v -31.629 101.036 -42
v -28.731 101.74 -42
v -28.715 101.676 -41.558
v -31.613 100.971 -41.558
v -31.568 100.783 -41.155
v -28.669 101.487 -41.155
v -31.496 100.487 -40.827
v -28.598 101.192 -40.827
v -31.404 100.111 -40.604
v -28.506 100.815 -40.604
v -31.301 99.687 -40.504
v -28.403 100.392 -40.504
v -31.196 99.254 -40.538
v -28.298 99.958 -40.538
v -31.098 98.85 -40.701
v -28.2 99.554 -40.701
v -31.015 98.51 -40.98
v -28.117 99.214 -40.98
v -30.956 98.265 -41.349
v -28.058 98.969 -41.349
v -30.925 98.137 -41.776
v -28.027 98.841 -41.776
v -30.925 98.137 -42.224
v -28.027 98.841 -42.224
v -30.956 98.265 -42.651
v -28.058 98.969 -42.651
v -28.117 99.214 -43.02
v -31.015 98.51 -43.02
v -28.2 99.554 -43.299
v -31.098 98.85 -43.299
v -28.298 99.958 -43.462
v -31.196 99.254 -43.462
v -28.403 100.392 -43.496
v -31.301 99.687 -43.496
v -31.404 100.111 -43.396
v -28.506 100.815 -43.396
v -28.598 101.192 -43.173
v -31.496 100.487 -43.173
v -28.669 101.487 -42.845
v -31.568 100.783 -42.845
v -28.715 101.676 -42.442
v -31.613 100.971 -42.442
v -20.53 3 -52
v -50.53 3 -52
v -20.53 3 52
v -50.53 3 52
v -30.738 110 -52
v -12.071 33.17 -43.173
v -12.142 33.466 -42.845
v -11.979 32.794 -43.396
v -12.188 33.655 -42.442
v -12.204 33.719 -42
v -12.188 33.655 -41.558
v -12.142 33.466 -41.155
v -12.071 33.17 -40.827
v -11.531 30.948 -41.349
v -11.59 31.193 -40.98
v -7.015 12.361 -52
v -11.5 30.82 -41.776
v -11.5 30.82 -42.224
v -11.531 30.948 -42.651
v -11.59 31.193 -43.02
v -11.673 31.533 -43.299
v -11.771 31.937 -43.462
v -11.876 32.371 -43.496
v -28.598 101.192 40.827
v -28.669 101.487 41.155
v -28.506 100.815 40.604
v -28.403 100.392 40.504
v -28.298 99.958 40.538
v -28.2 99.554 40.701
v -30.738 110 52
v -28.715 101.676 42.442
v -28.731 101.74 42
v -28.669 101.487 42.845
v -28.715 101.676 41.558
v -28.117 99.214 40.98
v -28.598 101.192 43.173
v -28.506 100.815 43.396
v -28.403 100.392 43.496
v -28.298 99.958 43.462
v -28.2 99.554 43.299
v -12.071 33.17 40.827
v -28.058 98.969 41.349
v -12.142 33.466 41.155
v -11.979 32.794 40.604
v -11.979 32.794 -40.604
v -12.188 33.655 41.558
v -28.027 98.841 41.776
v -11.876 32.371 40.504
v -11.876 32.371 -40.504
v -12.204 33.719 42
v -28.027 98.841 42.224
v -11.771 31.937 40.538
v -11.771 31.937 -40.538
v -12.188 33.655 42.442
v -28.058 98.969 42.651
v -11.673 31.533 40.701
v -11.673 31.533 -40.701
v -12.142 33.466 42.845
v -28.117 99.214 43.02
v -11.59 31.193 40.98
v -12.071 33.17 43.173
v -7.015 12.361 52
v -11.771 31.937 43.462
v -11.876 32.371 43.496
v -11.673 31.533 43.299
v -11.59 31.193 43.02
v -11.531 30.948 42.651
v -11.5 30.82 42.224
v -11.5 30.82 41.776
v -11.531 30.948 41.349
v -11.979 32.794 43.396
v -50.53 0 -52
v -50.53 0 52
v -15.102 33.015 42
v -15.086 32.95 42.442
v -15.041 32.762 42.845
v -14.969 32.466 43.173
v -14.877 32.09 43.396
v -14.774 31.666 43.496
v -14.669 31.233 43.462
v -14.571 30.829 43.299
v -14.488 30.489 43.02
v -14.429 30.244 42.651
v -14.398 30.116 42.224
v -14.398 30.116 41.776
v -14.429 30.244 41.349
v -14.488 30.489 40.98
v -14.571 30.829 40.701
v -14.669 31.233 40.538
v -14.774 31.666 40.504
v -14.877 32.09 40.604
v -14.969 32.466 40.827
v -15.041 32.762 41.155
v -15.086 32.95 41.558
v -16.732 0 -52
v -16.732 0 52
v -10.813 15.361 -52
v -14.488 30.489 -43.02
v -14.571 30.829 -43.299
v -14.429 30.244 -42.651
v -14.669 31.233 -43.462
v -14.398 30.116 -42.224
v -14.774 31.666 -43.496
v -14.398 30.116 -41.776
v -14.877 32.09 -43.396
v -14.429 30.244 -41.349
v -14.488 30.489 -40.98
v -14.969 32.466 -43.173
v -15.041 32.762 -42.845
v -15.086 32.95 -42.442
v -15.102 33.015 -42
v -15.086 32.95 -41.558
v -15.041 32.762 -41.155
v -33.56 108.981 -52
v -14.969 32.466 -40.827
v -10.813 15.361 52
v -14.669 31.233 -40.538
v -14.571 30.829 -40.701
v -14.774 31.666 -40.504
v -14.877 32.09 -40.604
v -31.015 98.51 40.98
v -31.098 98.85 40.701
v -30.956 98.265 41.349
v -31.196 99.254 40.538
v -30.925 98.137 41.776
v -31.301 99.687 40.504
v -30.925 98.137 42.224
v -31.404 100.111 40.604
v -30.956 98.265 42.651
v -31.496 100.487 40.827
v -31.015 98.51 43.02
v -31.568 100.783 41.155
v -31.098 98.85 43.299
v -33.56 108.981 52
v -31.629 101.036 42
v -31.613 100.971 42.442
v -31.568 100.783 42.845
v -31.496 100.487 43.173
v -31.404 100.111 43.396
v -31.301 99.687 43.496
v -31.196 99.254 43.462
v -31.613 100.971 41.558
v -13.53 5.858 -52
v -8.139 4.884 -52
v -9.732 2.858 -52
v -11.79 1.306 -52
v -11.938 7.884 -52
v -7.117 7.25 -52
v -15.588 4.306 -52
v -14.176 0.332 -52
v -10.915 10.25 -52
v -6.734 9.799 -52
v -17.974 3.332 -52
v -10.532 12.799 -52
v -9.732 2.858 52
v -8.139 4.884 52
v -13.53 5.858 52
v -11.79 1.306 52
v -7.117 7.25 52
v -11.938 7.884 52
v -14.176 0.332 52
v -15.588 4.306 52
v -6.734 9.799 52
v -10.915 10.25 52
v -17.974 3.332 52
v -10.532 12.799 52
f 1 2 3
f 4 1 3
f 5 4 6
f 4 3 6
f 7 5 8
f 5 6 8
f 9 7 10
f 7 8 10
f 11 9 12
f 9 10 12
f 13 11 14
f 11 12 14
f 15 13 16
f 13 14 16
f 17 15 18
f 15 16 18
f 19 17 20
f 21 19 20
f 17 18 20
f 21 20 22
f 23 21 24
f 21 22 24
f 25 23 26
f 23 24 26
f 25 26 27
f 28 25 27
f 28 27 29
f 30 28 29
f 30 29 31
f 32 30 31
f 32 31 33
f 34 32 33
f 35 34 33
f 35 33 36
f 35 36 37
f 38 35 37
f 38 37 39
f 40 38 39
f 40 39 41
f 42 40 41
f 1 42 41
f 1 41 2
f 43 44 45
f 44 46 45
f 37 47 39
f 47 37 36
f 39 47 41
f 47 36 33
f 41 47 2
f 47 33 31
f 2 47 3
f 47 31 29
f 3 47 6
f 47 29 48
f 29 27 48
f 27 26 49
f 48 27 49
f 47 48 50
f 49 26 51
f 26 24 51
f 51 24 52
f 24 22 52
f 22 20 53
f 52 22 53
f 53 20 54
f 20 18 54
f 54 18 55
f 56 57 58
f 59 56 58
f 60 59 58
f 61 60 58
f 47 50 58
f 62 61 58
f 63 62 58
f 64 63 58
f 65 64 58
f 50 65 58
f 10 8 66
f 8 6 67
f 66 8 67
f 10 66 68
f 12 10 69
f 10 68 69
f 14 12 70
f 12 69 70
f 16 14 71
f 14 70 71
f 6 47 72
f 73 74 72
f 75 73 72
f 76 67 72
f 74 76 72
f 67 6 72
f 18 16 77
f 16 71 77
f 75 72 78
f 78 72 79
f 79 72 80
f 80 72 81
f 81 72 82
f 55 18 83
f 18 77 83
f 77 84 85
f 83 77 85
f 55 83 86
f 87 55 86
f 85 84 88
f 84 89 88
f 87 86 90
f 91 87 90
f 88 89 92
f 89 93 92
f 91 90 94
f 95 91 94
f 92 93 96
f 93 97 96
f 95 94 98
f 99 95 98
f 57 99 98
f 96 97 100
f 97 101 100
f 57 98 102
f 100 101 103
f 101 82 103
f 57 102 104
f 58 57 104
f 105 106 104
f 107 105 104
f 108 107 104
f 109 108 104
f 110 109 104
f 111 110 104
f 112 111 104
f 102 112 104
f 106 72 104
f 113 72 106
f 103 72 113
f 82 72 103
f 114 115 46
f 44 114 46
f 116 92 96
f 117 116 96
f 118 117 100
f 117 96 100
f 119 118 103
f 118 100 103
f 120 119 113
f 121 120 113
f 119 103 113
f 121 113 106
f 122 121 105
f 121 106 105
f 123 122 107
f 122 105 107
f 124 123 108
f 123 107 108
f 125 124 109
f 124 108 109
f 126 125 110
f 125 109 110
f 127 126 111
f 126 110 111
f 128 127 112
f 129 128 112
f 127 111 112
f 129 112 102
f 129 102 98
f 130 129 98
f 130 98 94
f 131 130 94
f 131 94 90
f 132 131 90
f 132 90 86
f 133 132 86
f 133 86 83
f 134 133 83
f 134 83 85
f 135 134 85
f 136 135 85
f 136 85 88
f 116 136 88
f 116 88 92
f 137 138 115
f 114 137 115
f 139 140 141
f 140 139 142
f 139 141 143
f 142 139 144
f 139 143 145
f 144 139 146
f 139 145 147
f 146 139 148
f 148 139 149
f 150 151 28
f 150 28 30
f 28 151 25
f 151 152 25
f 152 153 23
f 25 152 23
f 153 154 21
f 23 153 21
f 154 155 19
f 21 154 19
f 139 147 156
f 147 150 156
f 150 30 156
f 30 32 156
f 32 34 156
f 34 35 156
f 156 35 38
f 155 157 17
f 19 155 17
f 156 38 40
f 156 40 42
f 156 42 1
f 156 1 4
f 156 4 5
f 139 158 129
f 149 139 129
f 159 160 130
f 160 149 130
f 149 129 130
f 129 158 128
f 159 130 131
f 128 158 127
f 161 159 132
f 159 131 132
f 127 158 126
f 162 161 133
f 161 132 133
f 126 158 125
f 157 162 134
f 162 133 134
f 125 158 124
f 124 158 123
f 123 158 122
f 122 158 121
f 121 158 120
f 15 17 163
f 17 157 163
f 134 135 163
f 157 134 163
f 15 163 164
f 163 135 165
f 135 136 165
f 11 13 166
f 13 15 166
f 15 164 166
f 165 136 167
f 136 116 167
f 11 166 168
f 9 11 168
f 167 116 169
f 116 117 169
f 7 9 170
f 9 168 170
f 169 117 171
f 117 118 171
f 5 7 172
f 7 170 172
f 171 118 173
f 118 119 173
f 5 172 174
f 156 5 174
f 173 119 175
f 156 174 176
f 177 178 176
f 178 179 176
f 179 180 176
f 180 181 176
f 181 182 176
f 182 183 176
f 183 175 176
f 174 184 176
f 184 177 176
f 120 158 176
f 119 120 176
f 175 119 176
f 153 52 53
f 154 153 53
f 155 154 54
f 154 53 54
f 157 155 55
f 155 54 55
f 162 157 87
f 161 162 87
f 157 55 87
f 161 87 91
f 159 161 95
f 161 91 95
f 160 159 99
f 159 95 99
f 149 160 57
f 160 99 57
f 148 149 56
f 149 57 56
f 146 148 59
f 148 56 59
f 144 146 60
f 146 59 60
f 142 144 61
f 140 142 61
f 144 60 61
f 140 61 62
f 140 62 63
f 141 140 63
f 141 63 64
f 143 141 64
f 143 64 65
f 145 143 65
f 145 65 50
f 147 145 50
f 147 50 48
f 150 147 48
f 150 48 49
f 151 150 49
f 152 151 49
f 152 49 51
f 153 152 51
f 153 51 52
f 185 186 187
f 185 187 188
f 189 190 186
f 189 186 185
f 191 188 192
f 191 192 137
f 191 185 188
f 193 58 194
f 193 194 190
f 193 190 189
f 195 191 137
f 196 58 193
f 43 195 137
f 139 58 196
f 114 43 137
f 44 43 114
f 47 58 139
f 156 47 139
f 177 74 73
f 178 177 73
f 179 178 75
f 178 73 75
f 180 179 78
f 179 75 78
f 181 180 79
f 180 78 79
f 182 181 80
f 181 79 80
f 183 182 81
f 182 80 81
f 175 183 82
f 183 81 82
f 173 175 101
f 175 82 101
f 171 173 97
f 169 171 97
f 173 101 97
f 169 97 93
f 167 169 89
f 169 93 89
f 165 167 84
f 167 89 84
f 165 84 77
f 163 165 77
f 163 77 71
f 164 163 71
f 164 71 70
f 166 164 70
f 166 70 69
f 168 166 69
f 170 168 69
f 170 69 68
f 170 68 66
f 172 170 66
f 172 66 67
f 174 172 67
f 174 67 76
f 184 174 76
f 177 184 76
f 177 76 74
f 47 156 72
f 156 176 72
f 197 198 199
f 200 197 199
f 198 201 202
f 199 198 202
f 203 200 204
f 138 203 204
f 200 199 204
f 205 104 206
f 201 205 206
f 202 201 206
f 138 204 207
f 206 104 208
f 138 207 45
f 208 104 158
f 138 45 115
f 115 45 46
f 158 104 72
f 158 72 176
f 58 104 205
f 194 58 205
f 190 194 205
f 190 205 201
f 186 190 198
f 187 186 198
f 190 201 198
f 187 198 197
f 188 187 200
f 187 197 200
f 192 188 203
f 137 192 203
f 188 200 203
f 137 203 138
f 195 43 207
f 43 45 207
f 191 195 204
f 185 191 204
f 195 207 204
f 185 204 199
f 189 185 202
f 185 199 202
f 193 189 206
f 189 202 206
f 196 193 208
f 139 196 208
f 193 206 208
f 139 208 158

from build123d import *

# Parameters (mm, degrees)
BOSS_EXTRUDE1_DEPTH = 52
CUT_EXTRUDE_1_REACH = 133.119
SKETCH_2_R          = 1.5


with BuildPart() as part:
    # Sketch1 → Boss-Extrude1 (new, symmetric)
    with BuildSketch(Plane.XY):
        with BuildLine():
            Line((-50.530004832, 0), (-50.530004832, 3))
            Line((-50.530004832, 3), (-20.530004832, 3))
            ThreePointArc((-20.530004832, 3), (-12.668388321, 6.819790793), (-10.812717884, 15.361002831))
            Line((-10.812717884, 15.361002831), (-33.559523327, 108.981066609))
            Line((-33.559523327, 108.981066609), (-30.737861628, 110))
            Line((-30.737861628, 110), (-7.014578577, 12.361002831))
            ThreePointArc((-7.014578577, 12.361002831), (-8.870249014, 3.819790793), (-16.731865525, 0))
            Line((-16.731865525, 0), (-50.530004832, 0))
        make_face()
    extrude(amount=BOSS_EXTRUDE1_DEPTH, both=True)

    # Эскиз2 → Вырез-Вытянуть1 (cut, up to next)
    with BuildSketch(Plane(origin=(-3.787634246, -0.920279007, 0), x_dir=(0, 0, -1), z_dir=(0.9717286948053453, 0.2361002831254127, 0)), mode=Mode.PRIVATE) as cut_extrude_1_sk1:
        with Locations(Location((-42, 104.147374262, 0), (0, 0, 90))):
            Circle(SKETCH_2_R)
    cut_extrude_1_tool1 = extrude(cut_extrude_1_sk1.sketch, amount=-CUT_EXTRUDE_1_REACH, mode=Mode.PRIVATE) & part.part
    # Эскиз2 → Вырез-Вытянуть1 (cut, up to next)
    with BuildSketch(Plane(origin=(-3.787634246, -0.920279007, 0), x_dir=(0, 0, -1), z_dir=(0.9717286948053453, 0.2361002831254127, 0)), mode=Mode.PRIVATE) as cut_extrude_1_sk2:
        with Locations(Location((42, 104.147374262, 0), (0, 0, 90))):
            Circle(SKETCH_2_R)
    cut_extrude_1_tool2 = extrude(cut_extrude_1_sk2.sketch, amount=-CUT_EXTRUDE_1_REACH, mode=Mode.PRIVATE) & part.part
    # Эскиз2 → Вырез-Вытянуть1 (cut, up to next)
    with BuildSketch(Plane(origin=(-3.787634246, -0.920279007, 0), x_dir=(0, 0, -1), z_dir=(0.9717286948053453, 0.2361002831254127, 0)), mode=Mode.PRIVATE) as cut_extrude_1_sk3:
        with Locations(Location((42, 34.147374262, 0), (0, 0, 90))):
            Circle(SKETCH_2_R)
    cut_extrude_1_tool3 = extrude(cut_extrude_1_sk3.sketch, amount=-CUT_EXTRUDE_1_REACH, mode=Mode.PRIVATE) & part.part
    # Эскиз2 → Вырез-Вытянуть1 (cut, up to next)
    with BuildSketch(Plane(origin=(-3.787634246, -0.920279007, 0), x_dir=(0, 0, -1), z_dir=(0.9717286948053453, 0.2361002831254127, 0)), mode=Mode.PRIVATE) as cut_extrude_1_sk4:
        with Locations(Location((-42, 34.147374262, 0), (0, 0, 90))):
            Circle(SKETCH_2_R)
    cut_extrude_1_tool4 = extrude(cut_extrude_1_sk4.sketch, amount=-CUT_EXTRUDE_1_REACH, mode=Mode.PRIVATE) & part.part
    add(cut_extrude_1_tool1.solids().sort_by_distance((-28.376859, 100.282713, 42))[0], mode=Mode.SUBTRACT)
    add(cut_extrude_1_tool2.solids().sort_by_distance((-28.376859, 100.282713, -42))[0], mode=Mode.SUBTRACT)
    add(cut_extrude_1_tool3.solids().sort_by_distance((-11.849839, 32.261704, -42))[0], mode=Mode.SUBTRACT)
    add(cut_extrude_1_tool4.solids().sort_by_distance((-11.849839, 32.261704, 42))[0], mode=Mode.SUBTRACT)


solid = part.part
